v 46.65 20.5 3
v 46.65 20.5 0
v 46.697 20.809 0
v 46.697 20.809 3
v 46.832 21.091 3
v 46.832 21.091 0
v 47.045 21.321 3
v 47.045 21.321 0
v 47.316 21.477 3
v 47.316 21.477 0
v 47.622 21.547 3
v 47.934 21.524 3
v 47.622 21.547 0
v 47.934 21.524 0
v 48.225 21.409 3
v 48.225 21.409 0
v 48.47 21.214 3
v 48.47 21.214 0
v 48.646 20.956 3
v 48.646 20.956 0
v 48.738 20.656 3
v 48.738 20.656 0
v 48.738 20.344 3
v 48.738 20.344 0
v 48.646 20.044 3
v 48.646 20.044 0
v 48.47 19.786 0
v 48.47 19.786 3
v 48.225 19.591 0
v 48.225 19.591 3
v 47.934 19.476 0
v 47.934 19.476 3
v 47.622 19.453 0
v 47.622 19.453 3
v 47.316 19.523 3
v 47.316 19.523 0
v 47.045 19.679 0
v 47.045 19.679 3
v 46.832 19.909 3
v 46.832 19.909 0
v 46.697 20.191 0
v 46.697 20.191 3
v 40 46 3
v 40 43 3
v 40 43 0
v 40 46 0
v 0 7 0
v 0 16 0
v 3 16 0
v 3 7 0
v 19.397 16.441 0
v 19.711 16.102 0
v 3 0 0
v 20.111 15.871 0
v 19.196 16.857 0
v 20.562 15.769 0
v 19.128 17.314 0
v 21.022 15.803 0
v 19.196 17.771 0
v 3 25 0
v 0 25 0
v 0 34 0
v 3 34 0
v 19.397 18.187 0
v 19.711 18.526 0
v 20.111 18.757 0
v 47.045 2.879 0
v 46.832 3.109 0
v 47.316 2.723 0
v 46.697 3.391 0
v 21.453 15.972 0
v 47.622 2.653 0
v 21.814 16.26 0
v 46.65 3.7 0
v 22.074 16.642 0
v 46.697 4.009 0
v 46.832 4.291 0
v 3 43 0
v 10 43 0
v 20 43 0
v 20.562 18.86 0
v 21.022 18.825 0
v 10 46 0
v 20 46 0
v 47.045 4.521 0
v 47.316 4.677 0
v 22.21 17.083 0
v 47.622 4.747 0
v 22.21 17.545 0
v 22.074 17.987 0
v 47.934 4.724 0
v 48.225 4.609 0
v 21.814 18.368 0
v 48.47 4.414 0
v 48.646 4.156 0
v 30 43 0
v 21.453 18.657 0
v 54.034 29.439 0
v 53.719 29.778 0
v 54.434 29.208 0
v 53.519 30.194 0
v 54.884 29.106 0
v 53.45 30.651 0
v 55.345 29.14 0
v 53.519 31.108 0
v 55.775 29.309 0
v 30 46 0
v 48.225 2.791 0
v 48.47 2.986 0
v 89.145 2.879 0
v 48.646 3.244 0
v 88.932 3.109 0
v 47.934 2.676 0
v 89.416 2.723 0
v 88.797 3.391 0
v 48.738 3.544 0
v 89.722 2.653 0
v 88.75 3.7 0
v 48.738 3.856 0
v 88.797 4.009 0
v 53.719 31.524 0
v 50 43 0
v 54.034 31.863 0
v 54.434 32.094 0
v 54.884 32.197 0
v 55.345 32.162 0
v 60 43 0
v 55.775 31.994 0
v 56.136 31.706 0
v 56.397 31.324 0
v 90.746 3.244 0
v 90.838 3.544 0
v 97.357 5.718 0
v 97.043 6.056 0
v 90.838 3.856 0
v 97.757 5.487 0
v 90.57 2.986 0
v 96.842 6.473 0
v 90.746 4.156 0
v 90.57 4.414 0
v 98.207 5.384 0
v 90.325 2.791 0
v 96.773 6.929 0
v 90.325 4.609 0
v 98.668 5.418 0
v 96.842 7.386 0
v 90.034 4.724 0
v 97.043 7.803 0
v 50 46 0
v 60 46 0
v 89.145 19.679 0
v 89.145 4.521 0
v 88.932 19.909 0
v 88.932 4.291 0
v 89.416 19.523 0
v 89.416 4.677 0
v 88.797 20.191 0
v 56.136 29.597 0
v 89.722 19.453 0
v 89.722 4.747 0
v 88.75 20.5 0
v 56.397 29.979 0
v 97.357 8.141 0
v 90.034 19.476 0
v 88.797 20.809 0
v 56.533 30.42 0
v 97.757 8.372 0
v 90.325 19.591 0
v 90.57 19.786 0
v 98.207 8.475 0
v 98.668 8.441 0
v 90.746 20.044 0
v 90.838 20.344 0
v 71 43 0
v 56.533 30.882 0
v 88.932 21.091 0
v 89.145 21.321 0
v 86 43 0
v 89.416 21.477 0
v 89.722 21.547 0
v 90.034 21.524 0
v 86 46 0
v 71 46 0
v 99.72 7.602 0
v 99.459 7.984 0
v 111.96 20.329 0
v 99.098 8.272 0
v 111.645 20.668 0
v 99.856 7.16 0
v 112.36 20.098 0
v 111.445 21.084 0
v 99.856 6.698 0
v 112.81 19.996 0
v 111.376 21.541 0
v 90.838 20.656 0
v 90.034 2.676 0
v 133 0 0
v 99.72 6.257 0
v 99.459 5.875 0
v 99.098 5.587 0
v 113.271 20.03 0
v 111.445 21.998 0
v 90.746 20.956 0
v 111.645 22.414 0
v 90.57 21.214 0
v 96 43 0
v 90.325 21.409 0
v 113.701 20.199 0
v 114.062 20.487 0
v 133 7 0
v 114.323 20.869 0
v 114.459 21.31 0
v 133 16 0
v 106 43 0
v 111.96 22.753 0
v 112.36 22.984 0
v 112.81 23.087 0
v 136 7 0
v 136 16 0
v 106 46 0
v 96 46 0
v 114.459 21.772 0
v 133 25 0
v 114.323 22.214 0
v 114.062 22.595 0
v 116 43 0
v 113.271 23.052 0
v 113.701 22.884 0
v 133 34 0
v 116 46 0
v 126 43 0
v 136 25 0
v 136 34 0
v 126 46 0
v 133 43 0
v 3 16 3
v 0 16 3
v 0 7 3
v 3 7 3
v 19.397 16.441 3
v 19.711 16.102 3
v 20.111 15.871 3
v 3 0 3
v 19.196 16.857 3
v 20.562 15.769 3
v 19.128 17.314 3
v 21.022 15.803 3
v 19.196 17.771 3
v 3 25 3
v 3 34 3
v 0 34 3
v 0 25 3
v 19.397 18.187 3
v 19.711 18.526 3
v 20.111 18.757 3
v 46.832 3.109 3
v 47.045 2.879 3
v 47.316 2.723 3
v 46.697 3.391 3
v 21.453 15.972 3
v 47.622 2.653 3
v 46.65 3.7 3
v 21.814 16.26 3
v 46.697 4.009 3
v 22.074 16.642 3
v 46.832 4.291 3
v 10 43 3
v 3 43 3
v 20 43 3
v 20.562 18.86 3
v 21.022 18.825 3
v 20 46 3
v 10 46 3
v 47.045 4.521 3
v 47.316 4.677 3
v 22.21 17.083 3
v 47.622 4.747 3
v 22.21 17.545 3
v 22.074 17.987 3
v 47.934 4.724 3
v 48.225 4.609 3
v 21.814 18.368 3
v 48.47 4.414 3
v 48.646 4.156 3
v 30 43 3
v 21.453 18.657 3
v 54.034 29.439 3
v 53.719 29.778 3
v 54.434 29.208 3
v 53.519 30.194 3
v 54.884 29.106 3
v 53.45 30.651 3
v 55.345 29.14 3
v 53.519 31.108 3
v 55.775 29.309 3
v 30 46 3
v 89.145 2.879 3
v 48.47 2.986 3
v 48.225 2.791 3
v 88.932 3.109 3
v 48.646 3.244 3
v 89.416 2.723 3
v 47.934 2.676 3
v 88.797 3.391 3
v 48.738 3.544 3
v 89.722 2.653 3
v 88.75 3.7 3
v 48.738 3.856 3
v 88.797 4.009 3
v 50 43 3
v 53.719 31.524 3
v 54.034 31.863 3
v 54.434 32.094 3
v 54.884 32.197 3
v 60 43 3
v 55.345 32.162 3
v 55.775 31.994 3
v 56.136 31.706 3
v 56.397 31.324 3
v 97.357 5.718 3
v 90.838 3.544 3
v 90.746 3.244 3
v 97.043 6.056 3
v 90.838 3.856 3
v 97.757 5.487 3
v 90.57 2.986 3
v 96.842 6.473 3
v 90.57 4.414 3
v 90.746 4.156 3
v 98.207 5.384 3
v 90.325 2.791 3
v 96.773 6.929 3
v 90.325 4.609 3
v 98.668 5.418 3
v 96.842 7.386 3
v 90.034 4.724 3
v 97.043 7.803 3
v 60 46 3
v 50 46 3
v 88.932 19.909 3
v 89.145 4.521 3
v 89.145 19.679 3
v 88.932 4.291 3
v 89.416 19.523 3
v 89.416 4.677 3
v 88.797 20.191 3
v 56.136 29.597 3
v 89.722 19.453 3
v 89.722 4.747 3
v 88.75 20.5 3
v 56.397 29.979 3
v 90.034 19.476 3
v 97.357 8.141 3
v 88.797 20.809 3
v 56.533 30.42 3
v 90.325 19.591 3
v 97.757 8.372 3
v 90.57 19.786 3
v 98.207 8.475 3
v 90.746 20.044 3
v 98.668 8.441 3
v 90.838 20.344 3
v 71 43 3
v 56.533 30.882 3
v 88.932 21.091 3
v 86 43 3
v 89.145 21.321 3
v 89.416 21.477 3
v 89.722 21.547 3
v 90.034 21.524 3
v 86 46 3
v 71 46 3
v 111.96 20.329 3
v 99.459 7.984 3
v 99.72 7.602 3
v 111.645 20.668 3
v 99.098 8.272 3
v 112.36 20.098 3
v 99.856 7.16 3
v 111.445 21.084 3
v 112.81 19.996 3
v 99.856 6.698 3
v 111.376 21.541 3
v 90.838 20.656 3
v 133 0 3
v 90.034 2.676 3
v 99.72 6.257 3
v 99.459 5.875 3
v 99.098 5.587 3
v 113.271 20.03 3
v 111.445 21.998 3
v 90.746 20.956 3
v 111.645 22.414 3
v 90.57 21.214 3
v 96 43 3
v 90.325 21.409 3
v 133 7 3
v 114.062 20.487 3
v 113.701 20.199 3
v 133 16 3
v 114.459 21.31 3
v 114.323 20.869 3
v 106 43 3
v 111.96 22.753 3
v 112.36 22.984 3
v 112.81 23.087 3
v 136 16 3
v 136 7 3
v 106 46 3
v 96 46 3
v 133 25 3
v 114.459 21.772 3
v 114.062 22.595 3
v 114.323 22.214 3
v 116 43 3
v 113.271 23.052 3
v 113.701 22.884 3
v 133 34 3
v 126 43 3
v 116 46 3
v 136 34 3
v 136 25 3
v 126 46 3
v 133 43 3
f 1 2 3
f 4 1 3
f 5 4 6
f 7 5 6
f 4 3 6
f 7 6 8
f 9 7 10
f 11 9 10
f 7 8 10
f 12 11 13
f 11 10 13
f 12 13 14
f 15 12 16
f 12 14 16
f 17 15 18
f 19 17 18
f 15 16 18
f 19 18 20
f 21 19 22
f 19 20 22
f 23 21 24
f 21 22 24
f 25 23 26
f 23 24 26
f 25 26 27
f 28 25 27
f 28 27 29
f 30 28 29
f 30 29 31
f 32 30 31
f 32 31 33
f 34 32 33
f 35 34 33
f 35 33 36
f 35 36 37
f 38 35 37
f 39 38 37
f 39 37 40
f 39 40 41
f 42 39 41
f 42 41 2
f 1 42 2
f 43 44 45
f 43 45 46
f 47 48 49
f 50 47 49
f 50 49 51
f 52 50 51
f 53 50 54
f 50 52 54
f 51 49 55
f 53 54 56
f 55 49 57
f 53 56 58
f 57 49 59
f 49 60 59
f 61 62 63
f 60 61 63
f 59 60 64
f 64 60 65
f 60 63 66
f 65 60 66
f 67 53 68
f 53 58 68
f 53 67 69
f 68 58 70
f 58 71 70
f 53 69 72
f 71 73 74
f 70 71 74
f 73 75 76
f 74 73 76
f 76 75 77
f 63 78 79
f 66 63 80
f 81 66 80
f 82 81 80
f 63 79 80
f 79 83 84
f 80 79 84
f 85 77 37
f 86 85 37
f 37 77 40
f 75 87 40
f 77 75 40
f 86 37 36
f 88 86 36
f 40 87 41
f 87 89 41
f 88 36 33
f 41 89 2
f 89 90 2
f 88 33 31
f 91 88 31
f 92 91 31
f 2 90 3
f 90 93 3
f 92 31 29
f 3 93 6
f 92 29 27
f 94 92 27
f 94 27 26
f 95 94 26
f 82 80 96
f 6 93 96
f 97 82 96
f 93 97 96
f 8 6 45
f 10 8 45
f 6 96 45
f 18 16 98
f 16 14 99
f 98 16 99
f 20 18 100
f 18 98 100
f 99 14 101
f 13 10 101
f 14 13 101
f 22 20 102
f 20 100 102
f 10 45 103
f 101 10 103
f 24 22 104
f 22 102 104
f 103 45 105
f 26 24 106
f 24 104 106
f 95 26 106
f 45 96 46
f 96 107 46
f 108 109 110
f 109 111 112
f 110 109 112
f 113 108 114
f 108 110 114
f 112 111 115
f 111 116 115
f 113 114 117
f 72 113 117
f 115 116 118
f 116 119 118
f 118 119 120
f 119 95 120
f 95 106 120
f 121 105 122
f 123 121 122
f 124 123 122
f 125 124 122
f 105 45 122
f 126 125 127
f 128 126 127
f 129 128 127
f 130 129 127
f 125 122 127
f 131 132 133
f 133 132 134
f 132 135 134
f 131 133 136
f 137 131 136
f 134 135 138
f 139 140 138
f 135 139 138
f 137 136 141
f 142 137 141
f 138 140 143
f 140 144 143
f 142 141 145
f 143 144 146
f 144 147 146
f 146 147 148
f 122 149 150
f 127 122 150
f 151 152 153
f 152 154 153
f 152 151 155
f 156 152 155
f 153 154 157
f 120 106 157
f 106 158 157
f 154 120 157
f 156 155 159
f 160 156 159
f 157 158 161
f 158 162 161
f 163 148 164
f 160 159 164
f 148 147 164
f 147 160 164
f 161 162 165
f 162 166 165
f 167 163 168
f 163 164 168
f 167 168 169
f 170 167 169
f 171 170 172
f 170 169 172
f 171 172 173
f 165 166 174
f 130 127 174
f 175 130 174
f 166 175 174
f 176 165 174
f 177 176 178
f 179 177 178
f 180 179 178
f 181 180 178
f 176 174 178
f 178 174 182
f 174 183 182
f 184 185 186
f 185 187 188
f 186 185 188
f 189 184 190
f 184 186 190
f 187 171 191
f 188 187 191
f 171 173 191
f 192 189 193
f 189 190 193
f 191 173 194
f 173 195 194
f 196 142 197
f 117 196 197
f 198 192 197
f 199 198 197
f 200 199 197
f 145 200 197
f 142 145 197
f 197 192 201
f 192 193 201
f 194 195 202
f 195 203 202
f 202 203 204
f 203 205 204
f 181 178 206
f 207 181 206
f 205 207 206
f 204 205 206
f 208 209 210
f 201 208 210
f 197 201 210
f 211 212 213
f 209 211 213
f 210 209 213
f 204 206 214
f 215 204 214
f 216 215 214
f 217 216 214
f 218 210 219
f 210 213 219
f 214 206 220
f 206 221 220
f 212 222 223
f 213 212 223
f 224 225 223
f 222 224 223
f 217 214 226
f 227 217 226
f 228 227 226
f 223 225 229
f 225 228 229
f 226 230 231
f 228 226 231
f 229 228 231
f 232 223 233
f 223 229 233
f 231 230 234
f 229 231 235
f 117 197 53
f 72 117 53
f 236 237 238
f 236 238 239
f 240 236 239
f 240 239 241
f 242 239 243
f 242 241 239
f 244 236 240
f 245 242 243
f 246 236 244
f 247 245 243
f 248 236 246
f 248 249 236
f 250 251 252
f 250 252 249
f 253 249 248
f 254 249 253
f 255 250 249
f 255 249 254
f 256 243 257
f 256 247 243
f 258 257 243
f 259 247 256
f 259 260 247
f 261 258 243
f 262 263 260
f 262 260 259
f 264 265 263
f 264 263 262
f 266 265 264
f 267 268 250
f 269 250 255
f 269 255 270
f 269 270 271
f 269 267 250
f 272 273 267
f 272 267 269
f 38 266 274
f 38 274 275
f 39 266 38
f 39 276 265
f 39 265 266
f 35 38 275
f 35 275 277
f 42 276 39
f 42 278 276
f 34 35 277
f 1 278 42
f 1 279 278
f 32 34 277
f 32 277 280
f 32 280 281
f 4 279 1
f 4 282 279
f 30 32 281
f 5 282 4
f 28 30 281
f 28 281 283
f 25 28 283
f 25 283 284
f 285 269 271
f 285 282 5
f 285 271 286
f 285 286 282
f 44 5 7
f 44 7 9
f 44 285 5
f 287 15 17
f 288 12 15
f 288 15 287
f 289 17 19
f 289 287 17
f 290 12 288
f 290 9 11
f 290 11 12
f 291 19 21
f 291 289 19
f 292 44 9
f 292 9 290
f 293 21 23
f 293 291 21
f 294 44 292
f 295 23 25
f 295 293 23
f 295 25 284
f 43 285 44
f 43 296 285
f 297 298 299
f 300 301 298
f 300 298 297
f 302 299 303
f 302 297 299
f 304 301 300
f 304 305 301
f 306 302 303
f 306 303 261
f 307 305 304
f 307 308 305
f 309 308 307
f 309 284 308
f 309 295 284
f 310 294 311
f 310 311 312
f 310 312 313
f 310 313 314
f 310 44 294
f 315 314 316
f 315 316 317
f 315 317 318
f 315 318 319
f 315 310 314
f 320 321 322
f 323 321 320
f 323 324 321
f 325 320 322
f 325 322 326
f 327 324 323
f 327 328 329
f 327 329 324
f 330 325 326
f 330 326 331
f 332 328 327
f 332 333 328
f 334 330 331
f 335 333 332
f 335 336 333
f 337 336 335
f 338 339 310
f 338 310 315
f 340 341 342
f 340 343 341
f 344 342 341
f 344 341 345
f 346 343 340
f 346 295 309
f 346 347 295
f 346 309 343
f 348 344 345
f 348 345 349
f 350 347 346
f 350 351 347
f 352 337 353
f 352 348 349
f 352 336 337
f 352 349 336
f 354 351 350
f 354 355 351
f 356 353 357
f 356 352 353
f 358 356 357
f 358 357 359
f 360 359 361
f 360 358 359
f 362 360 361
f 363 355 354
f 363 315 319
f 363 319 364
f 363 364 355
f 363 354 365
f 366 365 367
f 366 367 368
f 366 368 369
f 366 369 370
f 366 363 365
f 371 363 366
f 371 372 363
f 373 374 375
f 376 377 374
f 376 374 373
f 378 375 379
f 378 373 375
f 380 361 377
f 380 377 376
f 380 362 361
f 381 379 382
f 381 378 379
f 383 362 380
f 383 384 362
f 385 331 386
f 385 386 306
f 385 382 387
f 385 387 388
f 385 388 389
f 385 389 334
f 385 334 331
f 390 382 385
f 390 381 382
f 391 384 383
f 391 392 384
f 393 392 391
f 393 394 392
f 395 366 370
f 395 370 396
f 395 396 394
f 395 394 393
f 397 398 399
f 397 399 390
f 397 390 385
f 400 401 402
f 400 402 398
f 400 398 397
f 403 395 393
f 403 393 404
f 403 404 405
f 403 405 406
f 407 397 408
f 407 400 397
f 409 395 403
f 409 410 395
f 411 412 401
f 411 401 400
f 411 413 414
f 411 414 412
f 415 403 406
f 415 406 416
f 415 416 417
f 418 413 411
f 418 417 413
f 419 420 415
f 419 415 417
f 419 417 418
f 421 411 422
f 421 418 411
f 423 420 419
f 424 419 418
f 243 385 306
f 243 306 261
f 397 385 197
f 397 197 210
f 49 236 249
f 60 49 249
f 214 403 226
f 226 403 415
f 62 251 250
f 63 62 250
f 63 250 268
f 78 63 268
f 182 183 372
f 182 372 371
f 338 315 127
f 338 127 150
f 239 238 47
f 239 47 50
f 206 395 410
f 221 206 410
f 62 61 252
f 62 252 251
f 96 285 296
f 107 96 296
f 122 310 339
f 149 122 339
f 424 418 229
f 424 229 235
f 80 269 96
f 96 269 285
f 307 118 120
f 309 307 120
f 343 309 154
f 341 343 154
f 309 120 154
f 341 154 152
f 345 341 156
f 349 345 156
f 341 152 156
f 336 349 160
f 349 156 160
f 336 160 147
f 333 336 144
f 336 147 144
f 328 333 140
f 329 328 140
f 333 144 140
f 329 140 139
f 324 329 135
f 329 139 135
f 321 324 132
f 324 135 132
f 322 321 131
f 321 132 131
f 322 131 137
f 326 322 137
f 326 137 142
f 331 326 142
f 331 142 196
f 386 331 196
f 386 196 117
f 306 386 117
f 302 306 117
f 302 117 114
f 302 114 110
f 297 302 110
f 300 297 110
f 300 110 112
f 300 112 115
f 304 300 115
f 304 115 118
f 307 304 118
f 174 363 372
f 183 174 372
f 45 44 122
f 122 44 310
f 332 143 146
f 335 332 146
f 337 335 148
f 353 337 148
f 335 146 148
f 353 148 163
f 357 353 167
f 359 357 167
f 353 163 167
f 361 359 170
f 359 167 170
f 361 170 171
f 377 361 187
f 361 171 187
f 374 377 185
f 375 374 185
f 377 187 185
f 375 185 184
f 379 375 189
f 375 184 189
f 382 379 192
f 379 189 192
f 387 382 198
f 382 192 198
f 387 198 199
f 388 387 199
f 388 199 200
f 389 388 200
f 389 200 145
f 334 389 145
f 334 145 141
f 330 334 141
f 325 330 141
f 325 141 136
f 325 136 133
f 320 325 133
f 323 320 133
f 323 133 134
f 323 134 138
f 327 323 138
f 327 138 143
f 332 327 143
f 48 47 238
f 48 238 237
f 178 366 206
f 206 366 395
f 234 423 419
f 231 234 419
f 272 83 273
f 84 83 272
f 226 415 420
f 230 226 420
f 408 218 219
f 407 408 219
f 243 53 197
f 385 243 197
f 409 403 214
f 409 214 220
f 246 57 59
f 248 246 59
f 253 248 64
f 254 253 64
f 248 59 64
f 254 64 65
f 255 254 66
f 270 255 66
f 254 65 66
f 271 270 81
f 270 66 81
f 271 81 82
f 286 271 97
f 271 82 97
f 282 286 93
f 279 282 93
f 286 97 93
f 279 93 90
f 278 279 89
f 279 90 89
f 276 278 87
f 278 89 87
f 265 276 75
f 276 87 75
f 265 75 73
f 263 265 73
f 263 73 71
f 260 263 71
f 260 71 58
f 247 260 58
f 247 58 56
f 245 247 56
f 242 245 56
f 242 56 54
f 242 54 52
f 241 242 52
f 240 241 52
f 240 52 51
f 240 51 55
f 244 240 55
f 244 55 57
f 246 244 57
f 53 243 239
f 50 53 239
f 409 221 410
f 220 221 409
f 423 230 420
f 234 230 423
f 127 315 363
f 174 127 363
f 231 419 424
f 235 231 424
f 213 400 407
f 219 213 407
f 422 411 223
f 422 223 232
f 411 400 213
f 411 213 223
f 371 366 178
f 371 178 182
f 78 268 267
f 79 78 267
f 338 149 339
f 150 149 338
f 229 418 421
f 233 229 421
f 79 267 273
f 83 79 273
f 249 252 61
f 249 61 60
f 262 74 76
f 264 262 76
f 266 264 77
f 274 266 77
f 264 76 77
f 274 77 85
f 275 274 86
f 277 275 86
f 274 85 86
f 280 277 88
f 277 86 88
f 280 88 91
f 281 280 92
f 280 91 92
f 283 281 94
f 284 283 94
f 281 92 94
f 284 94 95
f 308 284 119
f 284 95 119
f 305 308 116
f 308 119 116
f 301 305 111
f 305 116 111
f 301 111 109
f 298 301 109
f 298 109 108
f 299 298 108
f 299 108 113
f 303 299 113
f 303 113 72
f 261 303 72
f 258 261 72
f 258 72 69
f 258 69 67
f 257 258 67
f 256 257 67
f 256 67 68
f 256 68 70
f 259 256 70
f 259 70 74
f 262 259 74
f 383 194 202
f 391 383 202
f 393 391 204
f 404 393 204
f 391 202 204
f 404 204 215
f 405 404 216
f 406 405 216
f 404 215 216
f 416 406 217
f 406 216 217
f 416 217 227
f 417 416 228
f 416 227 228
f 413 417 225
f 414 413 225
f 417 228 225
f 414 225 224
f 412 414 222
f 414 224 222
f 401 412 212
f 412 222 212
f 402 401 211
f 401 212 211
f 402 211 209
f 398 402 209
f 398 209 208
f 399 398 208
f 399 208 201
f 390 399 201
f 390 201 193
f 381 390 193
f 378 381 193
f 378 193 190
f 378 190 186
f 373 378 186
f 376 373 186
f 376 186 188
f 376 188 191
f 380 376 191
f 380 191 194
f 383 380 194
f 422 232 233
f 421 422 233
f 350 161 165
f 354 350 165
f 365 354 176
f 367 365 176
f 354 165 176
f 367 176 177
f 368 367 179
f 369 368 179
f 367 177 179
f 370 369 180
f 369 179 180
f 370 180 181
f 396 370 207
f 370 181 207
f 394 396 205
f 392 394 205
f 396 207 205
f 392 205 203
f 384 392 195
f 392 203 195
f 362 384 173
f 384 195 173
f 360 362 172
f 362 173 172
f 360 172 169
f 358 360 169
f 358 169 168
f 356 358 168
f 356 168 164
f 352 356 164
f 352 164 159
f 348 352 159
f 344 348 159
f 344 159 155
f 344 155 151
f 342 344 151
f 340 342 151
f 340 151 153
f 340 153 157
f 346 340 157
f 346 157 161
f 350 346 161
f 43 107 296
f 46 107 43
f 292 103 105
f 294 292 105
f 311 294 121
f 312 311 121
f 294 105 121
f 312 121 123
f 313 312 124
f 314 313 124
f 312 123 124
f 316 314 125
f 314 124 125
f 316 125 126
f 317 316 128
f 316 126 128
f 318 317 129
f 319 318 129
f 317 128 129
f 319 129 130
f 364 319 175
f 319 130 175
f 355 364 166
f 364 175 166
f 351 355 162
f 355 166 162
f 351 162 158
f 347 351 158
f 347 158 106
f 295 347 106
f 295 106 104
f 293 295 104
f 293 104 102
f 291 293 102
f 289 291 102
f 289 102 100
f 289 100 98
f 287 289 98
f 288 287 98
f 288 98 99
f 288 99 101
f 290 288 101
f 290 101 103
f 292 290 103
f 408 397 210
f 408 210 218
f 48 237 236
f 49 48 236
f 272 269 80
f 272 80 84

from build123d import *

# Parameters (mm, degrees)
SKETCH1_W           = 136
SKETCH1_H           = 46
BOSS_EXTRUDE1_DEPTH = 3
CUT_EXTRUDE1_REACH  = 5
SKETCH4_W           = 3
SKETCH4_H           = 9
SKETCH4_H_2         = 7
SKETCH4_W_2         = 10
SKETCH4_H_3         = 3
SKETCH4_W_3         = 11
CUT_EXTRUDE2_REACH  = 5
SKETCH5_R           = 1.05
SKETCH5_R_2         = 1.55


with BuildPart() as part:
    # Sketch1 → Boss-Extrude1 (new body)
    with BuildSketch(Plane.XY):
        with Locations((68, 23)):
            Rectangle(SKETCH1_W, SKETCH1_H)
    extrude(amount=BOSS_EXTRUDE1_DEPTH)

    # Sketch4 → Cut-Extrude1 (cut, up to next)
    with BuildSketch(Plane.XY.offset(3), mode=Mode.PRIVATE) as cut_extrude1_sk1:
        Polygon((0, 46), (0, 43), (3, 43), (10, 43), (10, 46), align=None)
    cut_extrude1_tool1 = extrude(cut_extrude1_sk1.sketch, amount=-CUT_EXTRUDE1_REACH, mode=Mode.PRIVATE) & part.part
    add(cut_extrude1_tool1.solids().sort_by_distance((5, 44.5, 3))[0], mode=Mode.SUBTRACT)
    # Sketch4 → Cut-Extrude1 (cut, up to next)
    with BuildSketch(Plane.XY.offset(3), mode=Mode.PRIVATE) as cut_extrude1_sk2:
        with Locations((1.5, 38.5)):
            Rectangle(SKETCH4_W, SKETCH4_H)
    cut_extrude1_tool2 = extrude(cut_extrude1_sk2.sketch, amount=-CUT_EXTRUDE1_REACH, mode=Mode.PRIVATE) & part.part
    add(cut_extrude1_tool2.solids().sort_by_distance((1.5, 38.5, 3))[0], mode=Mode.SUBTRACT)
    # Sketch4 → Cut-Extrude1 (cut, up to next)
    with BuildSketch(Plane.XY.offset(3), mode=Mode.PRIVATE) as cut_extrude1_sk3:
        with Locations((1.5, 20.5)):
            Rectangle(SKETCH4_W, SKETCH4_H)
    cut_extrude1_tool3 = extrude(cut_extrude1_sk3.sketch, amount=-CUT_EXTRUDE1_REACH, mode=Mode.PRIVATE) & part.part
    add(cut_extrude1_tool3.solids().sort_by_distance((1.5, 20.5, 3))[0], mode=Mode.SUBTRACT)
    # Sketch4 → Cut-Extrude1 (cut, up to next)
    with BuildSketch(Plane.XY.offset(3), mode=Mode.PRIVATE) as cut_extrude1_sk4:
        with Locations((1.5, 3.5)):
            Rectangle(SKETCH4_W, SKETCH4_H_2)
    cut_extrude1_tool4 = extrude(cut_extrude1_sk4.sketch, amount=-CUT_EXTRUDE1_REACH, mode=Mode.PRIVATE) & part.part
    add(cut_extrude1_tool4.solids().sort_by_distance((1.5, 3.5, 3))[0], mode=Mode.SUBTRACT)
    # Sketch4 → Cut-Extrude1 (cut, up to next)
    with BuildSketch(Plane.XY.offset(3), mode=Mode.PRIVATE) as cut_extrude1_sk5:
        with Locations((25, 44.5)):
            Rectangle(SKETCH4_W_2, SKETCH4_H_3)
    cut_extrude1_tool5 = extrude(cut_extrude1_sk5.sketch, amount=-CUT_EXTRUDE1_REACH, mode=Mode.PRIVATE) & part.part
    add(cut_extrude1_tool5.solids().sort_by_distance((25, 44.5, 3))[0], mode=Mode.SUBTRACT)
    # Sketch4 → Cut-Extrude1 (cut, up to next)
    with BuildSketch(Plane.XY.offset(3), mode=Mode.PRIVATE) as cut_extrude1_sk6:
        with Locations((45, 44.5)):
            Rectangle(SKETCH4_W_2, SKETCH4_H_3)
    cut_extrude1_tool6 = extrude(cut_extrude1_sk6.sketch, amount=-CUT_EXTRUDE1_REACH, mode=Mode.PRIVATE) & part.part
    add(cut_extrude1_tool6.solids().sort_by_distance((45, 44.5, 3))[0], mode=Mode.SUBTRACT)
    # Sketch4 → Cut-Extrude1 (cut, up to next)
    with BuildSketch(Plane.XY.offset(3), mode=Mode.PRIVATE) as cut_extrude1_sk7:
        with Locations((65.5, 44.5)):
            Rectangle(SKETCH4_W_3, SKETCH4_H_3)
    cut_extrude1_tool7 = extrude(cut_extrude1_sk7.sketch, amount=-CUT_EXTRUDE1_REACH, mode=Mode.PRIVATE) & part.part
    add(cut_extrude1_tool7.solids().sort_by_distance((65.5, 44.5, 3))[0], mode=Mode.SUBTRACT)
    # Sketch4 → Cut-Extrude1 (cut, up to next)
    with BuildSketch(Plane.XY.offset(3), mode=Mode.PRIVATE) as cut_extrude1_sk8:
        with Locations((91, 44.5)):
            Rectangle(SKETCH4_W_2, SKETCH4_H_3)
    cut_extrude1_tool8 = extrude(cut_extrude1_sk8.sketch, amount=-CUT_EXTRUDE1_REACH, mode=Mode.PRIVATE) & part.part
    add(cut_extrude1_tool8.solids().sort_by_distance((91, 44.5, 3))[0], mode=Mode.SUBTRACT)
    # Sketch4 → Cut-Extrude1 (cut, up to next)
    with BuildSketch(Plane.XY.offset(3), mode=Mode.PRIVATE) as cut_extrude1_sk9:
        with Locations((111, 44.5)):
            Rectangle(SKETCH4_W_2, SKETCH4_H_3)
    cut_extrude1_tool9 = extrude(cut_extrude1_sk9.sketch, amount=-CUT_EXTRUDE1_REACH, mode=Mode.PRIVATE) & part.part
    add(cut_extrude1_tool9.solids().sort_by_distance((111, 44.5, 3))[0], mode=Mode.SUBTRACT)
    # Sketch4 → Cut-Extrude1 (cut, up to next)
    with BuildSketch(Plane.XY.offset(3), mode=Mode.PRIVATE) as cut_extrude1_sk10:
        Polygon((133, 43), (136, 43), (136, 46), (126, 46), (126, 43), align=None)
    cut_extrude1_tool10 = extrude(cut_extrude1_sk10.sketch, amount=-CUT_EXTRUDE1_REACH, mode=Mode.PRIVATE) & part.part
    add(cut_extrude1_tool10.solids().sort_by_distance((131, 44.5, 3))[0], mode=Mode.SUBTRACT)
    # Sketch4 → Cut-Extrude1 (cut, up to next)
    with BuildSketch(Plane.XY.offset(3), mode=Mode.PRIVATE) as cut_extrude1_sk11:
        with Locations((134.5, 38.5)):
            Rectangle(SKETCH4_W, SKETCH4_H)
    cut_extrude1_tool11 = extrude(cut_extrude1_sk11.sketch, amount=-CUT_EXTRUDE1_REACH, mode=Mode.PRIVATE) & part.part
    add(cut_extrude1_tool11.solids().sort_by_distance((134.5, 38.5, 3))[0], mode=Mode.SUBTRACT)
    # Sketch4 → Cut-Extrude1 (cut, up to next)
    with BuildSketch(Plane.XY.offset(3), mode=Mode.PRIVATE) as cut_extrude1_sk12:
        with Locations((134.5, 20.5)):
            Rectangle(SKETCH4_W, SKETCH4_H)
    cut_extrude1_tool12 = extrude(cut_extrude1_sk12.sketch, amount=-CUT_EXTRUDE1_REACH, mode=Mode.PRIVATE) & part.part
    add(cut_extrude1_tool12.solids().sort_by_distance((134.5, 20.5, 3))[0], mode=Mode.SUBTRACT)
    # Sketch4 → Cut-Extrude1 (cut, up to next)
    with BuildSketch(Plane.XY.offset(3), mode=Mode.PRIVATE) as cut_extrude1_sk13:
        with Locations((134.5, 3.5)):
            Rectangle(SKETCH4_W, SKETCH4_H_2)
    cut_extrude1_tool13 = extrude(cut_extrude1_sk13.sketch, amount=-CUT_EXTRUDE1_REACH, mode=Mode.PRIVATE) & part.part
    add(cut_extrude1_tool13.solids().sort_by_distance((134.5, 3.5, 3))[0], mode=Mode.SUBTRACT)

    # Sketch5 → Cut-Extrude2 (cut, up to next)
    with BuildSketch(Plane(origin=(0, 0, 0), x_dir=(-1, 0, 0), z_dir=(0, 0, -1)), mode=Mode.PRIVATE) as cut_extrude2_sk1:
        with Locations((-89.8, 20.5)):
            Circle(SKETCH5_R)
    cut_extrude2_tool1 = extrude(cut_extrude2_sk1.sketch, amount=-CUT_EXTRUDE2_REACH, mode=Mode.PRIVATE) & part.part
    add(cut_extrude2_tool1.solids().sort_by_distance((89.8, 20.5, 0))[0], mode=Mode.SUBTRACT)
    # Sketch5 → Cut-Extrude2 (cut, up to next)
    with BuildSketch(Plane(origin=(0, 0, 0), x_dir=(-1, 0, 0), z_dir=(0, 0, -1)), mode=Mode.PRIVATE) as cut_extrude2_sk2:
        with Locations((-89.8, 3.7)):
            Circle(SKETCH5_R)
    cut_extrude2_tool2 = extrude(cut_extrude2_sk2.sketch, amount=-CUT_EXTRUDE2_REACH, mode=Mode.PRIVATE) & part.part
    add(cut_extrude2_tool2.solids().sort_by_distance((89.8, 3.7, 0))[0], mode=Mode.SUBTRACT)
    # Sketch5 → Cut-Extrude2 (cut, up to next)
    with BuildSketch(Plane(origin=(0, 0, 0), x_dir=(-1, 0, 0), z_dir=(0, 0, -1)), mode=Mode.PRIVATE) as cut_extrude2_sk3:
        with Locations((-47.7, 20.5)):
            Circle(SKETCH5_R)
    cut_extrude2_tool3 = extrude(cut_extrude2_sk3.sketch, amount=-CUT_EXTRUDE2_REACH, mode=Mode.PRIVATE) & part.part
    add(cut_extrude2_tool3.solids().sort_by_distance((47.7, 20.5, 0))[0], mode=Mode.SUBTRACT)
    # Sketch5 → Cut-Extrude2 (cut, up to next)
    with BuildSketch(Plane(origin=(0, 0, 0), x_dir=(-1, 0, 0), z_dir=(0, 0, -1)), mode=Mode.PRIVATE) as cut_extrude2_sk4:
        with Locations((-47.7, 3.7)):
            Circle(SKETCH5_R)
    cut_extrude2_tool4 = extrude(cut_extrude2_sk4.sketch, amount=-CUT_EXTRUDE2_REACH, mode=Mode.PRIVATE) & part.part
    add(cut_extrude2_tool4.solids().sort_by_distance((47.7, 3.7, 0))[0], mode=Mode.SUBTRACT)
    # Sketch5 → Cut-Extrude2 (cut, up to next)
    with BuildSketch(Plane(origin=(0, 0, 0), x_dir=(-1, 0, 0), z_dir=(0, 0, -1)), mode=Mode.PRIVATE) as cut_extrude2_sk5:
        with Locations((-20.677552724, 17.314204089)):
            Circle(SKETCH5_R_2)
    cut_extrude2_tool5 = extrude(cut_extrude2_sk5.sketch, amount=-CUT_EXTRUDE2_REACH, mode=Mode.PRIVATE) & part.part
    add(cut_extrude2_tool5.solids().sort_by_distance((20.677553, 17.314204, 0))[0], mode=Mode.SUBTRACT)
    # Sketch5 → Cut-Extrude2 (cut, up to next)
    with BuildSketch(Plane(origin=(0, 0, 0), x_dir=(-1, 0, 0), z_dir=(0, 0, -1)), mode=Mode.PRIVATE) as cut_extrude2_sk6:
        with Locations((-55, 30.651276125)):
            Circle(SKETCH5_R_2)
    cut_extrude2_tool6 = extrude(cut_extrude2_sk6.sketch, amount=-CUT_EXTRUDE2_REACH, mode=Mode.PRIVATE) & part.part
    add(cut_extrude2_tool6.solids().sort_by_distance((55, 30.651276, 0))[0], mode=Mode.SUBTRACT)
    # Sketch5 → Cut-Extrude2 (cut, up to next)
    with BuildSketch(Plane(origin=(0, 0, 0), x_dir=(-1, 0, 0), z_dir=(0, 0, -1)), mode=Mode.PRIVATE) as cut_extrude2_sk7:
        with Locations((-112.926148706, 21.541179951)):
            Circle(SKETCH5_R_2)
    cut_extrude2_tool7 = extrude(cut_extrude2_sk7.sketch, amount=-CUT_EXTRUDE2_REACH, mode=Mode.PRIVATE) & part.part
    add(cut_extrude2_tool7.solids().sort_by_distance((112.926149, 21.54118, 0))[0], mode=Mode.SUBTRACT)
    # Sketch5 → Cut-Extrude2 (cut, up to next)
    with BuildSketch(Plane(origin=(0, 0, 0), x_dir=(-1, 0, 0), z_dir=(0, 0, -1)), mode=Mode.PRIVATE) as cut_extrude2_sk8:
        with Locations((-98.323238206, 6.929404951)):
            Circle(SKETCH5_R_2)
    cut_extrude2_tool8 = extrude(cut_extrude2_sk8.sketch, amount=-CUT_EXTRUDE2_REACH, mode=Mode.PRIVATE) & part.part
    add(cut_extrude2_tool8.solids().sort_by_distance((98.323238, 6.929405, 0))[0], mode=Mode.SUBTRACT)


solid = part.part
